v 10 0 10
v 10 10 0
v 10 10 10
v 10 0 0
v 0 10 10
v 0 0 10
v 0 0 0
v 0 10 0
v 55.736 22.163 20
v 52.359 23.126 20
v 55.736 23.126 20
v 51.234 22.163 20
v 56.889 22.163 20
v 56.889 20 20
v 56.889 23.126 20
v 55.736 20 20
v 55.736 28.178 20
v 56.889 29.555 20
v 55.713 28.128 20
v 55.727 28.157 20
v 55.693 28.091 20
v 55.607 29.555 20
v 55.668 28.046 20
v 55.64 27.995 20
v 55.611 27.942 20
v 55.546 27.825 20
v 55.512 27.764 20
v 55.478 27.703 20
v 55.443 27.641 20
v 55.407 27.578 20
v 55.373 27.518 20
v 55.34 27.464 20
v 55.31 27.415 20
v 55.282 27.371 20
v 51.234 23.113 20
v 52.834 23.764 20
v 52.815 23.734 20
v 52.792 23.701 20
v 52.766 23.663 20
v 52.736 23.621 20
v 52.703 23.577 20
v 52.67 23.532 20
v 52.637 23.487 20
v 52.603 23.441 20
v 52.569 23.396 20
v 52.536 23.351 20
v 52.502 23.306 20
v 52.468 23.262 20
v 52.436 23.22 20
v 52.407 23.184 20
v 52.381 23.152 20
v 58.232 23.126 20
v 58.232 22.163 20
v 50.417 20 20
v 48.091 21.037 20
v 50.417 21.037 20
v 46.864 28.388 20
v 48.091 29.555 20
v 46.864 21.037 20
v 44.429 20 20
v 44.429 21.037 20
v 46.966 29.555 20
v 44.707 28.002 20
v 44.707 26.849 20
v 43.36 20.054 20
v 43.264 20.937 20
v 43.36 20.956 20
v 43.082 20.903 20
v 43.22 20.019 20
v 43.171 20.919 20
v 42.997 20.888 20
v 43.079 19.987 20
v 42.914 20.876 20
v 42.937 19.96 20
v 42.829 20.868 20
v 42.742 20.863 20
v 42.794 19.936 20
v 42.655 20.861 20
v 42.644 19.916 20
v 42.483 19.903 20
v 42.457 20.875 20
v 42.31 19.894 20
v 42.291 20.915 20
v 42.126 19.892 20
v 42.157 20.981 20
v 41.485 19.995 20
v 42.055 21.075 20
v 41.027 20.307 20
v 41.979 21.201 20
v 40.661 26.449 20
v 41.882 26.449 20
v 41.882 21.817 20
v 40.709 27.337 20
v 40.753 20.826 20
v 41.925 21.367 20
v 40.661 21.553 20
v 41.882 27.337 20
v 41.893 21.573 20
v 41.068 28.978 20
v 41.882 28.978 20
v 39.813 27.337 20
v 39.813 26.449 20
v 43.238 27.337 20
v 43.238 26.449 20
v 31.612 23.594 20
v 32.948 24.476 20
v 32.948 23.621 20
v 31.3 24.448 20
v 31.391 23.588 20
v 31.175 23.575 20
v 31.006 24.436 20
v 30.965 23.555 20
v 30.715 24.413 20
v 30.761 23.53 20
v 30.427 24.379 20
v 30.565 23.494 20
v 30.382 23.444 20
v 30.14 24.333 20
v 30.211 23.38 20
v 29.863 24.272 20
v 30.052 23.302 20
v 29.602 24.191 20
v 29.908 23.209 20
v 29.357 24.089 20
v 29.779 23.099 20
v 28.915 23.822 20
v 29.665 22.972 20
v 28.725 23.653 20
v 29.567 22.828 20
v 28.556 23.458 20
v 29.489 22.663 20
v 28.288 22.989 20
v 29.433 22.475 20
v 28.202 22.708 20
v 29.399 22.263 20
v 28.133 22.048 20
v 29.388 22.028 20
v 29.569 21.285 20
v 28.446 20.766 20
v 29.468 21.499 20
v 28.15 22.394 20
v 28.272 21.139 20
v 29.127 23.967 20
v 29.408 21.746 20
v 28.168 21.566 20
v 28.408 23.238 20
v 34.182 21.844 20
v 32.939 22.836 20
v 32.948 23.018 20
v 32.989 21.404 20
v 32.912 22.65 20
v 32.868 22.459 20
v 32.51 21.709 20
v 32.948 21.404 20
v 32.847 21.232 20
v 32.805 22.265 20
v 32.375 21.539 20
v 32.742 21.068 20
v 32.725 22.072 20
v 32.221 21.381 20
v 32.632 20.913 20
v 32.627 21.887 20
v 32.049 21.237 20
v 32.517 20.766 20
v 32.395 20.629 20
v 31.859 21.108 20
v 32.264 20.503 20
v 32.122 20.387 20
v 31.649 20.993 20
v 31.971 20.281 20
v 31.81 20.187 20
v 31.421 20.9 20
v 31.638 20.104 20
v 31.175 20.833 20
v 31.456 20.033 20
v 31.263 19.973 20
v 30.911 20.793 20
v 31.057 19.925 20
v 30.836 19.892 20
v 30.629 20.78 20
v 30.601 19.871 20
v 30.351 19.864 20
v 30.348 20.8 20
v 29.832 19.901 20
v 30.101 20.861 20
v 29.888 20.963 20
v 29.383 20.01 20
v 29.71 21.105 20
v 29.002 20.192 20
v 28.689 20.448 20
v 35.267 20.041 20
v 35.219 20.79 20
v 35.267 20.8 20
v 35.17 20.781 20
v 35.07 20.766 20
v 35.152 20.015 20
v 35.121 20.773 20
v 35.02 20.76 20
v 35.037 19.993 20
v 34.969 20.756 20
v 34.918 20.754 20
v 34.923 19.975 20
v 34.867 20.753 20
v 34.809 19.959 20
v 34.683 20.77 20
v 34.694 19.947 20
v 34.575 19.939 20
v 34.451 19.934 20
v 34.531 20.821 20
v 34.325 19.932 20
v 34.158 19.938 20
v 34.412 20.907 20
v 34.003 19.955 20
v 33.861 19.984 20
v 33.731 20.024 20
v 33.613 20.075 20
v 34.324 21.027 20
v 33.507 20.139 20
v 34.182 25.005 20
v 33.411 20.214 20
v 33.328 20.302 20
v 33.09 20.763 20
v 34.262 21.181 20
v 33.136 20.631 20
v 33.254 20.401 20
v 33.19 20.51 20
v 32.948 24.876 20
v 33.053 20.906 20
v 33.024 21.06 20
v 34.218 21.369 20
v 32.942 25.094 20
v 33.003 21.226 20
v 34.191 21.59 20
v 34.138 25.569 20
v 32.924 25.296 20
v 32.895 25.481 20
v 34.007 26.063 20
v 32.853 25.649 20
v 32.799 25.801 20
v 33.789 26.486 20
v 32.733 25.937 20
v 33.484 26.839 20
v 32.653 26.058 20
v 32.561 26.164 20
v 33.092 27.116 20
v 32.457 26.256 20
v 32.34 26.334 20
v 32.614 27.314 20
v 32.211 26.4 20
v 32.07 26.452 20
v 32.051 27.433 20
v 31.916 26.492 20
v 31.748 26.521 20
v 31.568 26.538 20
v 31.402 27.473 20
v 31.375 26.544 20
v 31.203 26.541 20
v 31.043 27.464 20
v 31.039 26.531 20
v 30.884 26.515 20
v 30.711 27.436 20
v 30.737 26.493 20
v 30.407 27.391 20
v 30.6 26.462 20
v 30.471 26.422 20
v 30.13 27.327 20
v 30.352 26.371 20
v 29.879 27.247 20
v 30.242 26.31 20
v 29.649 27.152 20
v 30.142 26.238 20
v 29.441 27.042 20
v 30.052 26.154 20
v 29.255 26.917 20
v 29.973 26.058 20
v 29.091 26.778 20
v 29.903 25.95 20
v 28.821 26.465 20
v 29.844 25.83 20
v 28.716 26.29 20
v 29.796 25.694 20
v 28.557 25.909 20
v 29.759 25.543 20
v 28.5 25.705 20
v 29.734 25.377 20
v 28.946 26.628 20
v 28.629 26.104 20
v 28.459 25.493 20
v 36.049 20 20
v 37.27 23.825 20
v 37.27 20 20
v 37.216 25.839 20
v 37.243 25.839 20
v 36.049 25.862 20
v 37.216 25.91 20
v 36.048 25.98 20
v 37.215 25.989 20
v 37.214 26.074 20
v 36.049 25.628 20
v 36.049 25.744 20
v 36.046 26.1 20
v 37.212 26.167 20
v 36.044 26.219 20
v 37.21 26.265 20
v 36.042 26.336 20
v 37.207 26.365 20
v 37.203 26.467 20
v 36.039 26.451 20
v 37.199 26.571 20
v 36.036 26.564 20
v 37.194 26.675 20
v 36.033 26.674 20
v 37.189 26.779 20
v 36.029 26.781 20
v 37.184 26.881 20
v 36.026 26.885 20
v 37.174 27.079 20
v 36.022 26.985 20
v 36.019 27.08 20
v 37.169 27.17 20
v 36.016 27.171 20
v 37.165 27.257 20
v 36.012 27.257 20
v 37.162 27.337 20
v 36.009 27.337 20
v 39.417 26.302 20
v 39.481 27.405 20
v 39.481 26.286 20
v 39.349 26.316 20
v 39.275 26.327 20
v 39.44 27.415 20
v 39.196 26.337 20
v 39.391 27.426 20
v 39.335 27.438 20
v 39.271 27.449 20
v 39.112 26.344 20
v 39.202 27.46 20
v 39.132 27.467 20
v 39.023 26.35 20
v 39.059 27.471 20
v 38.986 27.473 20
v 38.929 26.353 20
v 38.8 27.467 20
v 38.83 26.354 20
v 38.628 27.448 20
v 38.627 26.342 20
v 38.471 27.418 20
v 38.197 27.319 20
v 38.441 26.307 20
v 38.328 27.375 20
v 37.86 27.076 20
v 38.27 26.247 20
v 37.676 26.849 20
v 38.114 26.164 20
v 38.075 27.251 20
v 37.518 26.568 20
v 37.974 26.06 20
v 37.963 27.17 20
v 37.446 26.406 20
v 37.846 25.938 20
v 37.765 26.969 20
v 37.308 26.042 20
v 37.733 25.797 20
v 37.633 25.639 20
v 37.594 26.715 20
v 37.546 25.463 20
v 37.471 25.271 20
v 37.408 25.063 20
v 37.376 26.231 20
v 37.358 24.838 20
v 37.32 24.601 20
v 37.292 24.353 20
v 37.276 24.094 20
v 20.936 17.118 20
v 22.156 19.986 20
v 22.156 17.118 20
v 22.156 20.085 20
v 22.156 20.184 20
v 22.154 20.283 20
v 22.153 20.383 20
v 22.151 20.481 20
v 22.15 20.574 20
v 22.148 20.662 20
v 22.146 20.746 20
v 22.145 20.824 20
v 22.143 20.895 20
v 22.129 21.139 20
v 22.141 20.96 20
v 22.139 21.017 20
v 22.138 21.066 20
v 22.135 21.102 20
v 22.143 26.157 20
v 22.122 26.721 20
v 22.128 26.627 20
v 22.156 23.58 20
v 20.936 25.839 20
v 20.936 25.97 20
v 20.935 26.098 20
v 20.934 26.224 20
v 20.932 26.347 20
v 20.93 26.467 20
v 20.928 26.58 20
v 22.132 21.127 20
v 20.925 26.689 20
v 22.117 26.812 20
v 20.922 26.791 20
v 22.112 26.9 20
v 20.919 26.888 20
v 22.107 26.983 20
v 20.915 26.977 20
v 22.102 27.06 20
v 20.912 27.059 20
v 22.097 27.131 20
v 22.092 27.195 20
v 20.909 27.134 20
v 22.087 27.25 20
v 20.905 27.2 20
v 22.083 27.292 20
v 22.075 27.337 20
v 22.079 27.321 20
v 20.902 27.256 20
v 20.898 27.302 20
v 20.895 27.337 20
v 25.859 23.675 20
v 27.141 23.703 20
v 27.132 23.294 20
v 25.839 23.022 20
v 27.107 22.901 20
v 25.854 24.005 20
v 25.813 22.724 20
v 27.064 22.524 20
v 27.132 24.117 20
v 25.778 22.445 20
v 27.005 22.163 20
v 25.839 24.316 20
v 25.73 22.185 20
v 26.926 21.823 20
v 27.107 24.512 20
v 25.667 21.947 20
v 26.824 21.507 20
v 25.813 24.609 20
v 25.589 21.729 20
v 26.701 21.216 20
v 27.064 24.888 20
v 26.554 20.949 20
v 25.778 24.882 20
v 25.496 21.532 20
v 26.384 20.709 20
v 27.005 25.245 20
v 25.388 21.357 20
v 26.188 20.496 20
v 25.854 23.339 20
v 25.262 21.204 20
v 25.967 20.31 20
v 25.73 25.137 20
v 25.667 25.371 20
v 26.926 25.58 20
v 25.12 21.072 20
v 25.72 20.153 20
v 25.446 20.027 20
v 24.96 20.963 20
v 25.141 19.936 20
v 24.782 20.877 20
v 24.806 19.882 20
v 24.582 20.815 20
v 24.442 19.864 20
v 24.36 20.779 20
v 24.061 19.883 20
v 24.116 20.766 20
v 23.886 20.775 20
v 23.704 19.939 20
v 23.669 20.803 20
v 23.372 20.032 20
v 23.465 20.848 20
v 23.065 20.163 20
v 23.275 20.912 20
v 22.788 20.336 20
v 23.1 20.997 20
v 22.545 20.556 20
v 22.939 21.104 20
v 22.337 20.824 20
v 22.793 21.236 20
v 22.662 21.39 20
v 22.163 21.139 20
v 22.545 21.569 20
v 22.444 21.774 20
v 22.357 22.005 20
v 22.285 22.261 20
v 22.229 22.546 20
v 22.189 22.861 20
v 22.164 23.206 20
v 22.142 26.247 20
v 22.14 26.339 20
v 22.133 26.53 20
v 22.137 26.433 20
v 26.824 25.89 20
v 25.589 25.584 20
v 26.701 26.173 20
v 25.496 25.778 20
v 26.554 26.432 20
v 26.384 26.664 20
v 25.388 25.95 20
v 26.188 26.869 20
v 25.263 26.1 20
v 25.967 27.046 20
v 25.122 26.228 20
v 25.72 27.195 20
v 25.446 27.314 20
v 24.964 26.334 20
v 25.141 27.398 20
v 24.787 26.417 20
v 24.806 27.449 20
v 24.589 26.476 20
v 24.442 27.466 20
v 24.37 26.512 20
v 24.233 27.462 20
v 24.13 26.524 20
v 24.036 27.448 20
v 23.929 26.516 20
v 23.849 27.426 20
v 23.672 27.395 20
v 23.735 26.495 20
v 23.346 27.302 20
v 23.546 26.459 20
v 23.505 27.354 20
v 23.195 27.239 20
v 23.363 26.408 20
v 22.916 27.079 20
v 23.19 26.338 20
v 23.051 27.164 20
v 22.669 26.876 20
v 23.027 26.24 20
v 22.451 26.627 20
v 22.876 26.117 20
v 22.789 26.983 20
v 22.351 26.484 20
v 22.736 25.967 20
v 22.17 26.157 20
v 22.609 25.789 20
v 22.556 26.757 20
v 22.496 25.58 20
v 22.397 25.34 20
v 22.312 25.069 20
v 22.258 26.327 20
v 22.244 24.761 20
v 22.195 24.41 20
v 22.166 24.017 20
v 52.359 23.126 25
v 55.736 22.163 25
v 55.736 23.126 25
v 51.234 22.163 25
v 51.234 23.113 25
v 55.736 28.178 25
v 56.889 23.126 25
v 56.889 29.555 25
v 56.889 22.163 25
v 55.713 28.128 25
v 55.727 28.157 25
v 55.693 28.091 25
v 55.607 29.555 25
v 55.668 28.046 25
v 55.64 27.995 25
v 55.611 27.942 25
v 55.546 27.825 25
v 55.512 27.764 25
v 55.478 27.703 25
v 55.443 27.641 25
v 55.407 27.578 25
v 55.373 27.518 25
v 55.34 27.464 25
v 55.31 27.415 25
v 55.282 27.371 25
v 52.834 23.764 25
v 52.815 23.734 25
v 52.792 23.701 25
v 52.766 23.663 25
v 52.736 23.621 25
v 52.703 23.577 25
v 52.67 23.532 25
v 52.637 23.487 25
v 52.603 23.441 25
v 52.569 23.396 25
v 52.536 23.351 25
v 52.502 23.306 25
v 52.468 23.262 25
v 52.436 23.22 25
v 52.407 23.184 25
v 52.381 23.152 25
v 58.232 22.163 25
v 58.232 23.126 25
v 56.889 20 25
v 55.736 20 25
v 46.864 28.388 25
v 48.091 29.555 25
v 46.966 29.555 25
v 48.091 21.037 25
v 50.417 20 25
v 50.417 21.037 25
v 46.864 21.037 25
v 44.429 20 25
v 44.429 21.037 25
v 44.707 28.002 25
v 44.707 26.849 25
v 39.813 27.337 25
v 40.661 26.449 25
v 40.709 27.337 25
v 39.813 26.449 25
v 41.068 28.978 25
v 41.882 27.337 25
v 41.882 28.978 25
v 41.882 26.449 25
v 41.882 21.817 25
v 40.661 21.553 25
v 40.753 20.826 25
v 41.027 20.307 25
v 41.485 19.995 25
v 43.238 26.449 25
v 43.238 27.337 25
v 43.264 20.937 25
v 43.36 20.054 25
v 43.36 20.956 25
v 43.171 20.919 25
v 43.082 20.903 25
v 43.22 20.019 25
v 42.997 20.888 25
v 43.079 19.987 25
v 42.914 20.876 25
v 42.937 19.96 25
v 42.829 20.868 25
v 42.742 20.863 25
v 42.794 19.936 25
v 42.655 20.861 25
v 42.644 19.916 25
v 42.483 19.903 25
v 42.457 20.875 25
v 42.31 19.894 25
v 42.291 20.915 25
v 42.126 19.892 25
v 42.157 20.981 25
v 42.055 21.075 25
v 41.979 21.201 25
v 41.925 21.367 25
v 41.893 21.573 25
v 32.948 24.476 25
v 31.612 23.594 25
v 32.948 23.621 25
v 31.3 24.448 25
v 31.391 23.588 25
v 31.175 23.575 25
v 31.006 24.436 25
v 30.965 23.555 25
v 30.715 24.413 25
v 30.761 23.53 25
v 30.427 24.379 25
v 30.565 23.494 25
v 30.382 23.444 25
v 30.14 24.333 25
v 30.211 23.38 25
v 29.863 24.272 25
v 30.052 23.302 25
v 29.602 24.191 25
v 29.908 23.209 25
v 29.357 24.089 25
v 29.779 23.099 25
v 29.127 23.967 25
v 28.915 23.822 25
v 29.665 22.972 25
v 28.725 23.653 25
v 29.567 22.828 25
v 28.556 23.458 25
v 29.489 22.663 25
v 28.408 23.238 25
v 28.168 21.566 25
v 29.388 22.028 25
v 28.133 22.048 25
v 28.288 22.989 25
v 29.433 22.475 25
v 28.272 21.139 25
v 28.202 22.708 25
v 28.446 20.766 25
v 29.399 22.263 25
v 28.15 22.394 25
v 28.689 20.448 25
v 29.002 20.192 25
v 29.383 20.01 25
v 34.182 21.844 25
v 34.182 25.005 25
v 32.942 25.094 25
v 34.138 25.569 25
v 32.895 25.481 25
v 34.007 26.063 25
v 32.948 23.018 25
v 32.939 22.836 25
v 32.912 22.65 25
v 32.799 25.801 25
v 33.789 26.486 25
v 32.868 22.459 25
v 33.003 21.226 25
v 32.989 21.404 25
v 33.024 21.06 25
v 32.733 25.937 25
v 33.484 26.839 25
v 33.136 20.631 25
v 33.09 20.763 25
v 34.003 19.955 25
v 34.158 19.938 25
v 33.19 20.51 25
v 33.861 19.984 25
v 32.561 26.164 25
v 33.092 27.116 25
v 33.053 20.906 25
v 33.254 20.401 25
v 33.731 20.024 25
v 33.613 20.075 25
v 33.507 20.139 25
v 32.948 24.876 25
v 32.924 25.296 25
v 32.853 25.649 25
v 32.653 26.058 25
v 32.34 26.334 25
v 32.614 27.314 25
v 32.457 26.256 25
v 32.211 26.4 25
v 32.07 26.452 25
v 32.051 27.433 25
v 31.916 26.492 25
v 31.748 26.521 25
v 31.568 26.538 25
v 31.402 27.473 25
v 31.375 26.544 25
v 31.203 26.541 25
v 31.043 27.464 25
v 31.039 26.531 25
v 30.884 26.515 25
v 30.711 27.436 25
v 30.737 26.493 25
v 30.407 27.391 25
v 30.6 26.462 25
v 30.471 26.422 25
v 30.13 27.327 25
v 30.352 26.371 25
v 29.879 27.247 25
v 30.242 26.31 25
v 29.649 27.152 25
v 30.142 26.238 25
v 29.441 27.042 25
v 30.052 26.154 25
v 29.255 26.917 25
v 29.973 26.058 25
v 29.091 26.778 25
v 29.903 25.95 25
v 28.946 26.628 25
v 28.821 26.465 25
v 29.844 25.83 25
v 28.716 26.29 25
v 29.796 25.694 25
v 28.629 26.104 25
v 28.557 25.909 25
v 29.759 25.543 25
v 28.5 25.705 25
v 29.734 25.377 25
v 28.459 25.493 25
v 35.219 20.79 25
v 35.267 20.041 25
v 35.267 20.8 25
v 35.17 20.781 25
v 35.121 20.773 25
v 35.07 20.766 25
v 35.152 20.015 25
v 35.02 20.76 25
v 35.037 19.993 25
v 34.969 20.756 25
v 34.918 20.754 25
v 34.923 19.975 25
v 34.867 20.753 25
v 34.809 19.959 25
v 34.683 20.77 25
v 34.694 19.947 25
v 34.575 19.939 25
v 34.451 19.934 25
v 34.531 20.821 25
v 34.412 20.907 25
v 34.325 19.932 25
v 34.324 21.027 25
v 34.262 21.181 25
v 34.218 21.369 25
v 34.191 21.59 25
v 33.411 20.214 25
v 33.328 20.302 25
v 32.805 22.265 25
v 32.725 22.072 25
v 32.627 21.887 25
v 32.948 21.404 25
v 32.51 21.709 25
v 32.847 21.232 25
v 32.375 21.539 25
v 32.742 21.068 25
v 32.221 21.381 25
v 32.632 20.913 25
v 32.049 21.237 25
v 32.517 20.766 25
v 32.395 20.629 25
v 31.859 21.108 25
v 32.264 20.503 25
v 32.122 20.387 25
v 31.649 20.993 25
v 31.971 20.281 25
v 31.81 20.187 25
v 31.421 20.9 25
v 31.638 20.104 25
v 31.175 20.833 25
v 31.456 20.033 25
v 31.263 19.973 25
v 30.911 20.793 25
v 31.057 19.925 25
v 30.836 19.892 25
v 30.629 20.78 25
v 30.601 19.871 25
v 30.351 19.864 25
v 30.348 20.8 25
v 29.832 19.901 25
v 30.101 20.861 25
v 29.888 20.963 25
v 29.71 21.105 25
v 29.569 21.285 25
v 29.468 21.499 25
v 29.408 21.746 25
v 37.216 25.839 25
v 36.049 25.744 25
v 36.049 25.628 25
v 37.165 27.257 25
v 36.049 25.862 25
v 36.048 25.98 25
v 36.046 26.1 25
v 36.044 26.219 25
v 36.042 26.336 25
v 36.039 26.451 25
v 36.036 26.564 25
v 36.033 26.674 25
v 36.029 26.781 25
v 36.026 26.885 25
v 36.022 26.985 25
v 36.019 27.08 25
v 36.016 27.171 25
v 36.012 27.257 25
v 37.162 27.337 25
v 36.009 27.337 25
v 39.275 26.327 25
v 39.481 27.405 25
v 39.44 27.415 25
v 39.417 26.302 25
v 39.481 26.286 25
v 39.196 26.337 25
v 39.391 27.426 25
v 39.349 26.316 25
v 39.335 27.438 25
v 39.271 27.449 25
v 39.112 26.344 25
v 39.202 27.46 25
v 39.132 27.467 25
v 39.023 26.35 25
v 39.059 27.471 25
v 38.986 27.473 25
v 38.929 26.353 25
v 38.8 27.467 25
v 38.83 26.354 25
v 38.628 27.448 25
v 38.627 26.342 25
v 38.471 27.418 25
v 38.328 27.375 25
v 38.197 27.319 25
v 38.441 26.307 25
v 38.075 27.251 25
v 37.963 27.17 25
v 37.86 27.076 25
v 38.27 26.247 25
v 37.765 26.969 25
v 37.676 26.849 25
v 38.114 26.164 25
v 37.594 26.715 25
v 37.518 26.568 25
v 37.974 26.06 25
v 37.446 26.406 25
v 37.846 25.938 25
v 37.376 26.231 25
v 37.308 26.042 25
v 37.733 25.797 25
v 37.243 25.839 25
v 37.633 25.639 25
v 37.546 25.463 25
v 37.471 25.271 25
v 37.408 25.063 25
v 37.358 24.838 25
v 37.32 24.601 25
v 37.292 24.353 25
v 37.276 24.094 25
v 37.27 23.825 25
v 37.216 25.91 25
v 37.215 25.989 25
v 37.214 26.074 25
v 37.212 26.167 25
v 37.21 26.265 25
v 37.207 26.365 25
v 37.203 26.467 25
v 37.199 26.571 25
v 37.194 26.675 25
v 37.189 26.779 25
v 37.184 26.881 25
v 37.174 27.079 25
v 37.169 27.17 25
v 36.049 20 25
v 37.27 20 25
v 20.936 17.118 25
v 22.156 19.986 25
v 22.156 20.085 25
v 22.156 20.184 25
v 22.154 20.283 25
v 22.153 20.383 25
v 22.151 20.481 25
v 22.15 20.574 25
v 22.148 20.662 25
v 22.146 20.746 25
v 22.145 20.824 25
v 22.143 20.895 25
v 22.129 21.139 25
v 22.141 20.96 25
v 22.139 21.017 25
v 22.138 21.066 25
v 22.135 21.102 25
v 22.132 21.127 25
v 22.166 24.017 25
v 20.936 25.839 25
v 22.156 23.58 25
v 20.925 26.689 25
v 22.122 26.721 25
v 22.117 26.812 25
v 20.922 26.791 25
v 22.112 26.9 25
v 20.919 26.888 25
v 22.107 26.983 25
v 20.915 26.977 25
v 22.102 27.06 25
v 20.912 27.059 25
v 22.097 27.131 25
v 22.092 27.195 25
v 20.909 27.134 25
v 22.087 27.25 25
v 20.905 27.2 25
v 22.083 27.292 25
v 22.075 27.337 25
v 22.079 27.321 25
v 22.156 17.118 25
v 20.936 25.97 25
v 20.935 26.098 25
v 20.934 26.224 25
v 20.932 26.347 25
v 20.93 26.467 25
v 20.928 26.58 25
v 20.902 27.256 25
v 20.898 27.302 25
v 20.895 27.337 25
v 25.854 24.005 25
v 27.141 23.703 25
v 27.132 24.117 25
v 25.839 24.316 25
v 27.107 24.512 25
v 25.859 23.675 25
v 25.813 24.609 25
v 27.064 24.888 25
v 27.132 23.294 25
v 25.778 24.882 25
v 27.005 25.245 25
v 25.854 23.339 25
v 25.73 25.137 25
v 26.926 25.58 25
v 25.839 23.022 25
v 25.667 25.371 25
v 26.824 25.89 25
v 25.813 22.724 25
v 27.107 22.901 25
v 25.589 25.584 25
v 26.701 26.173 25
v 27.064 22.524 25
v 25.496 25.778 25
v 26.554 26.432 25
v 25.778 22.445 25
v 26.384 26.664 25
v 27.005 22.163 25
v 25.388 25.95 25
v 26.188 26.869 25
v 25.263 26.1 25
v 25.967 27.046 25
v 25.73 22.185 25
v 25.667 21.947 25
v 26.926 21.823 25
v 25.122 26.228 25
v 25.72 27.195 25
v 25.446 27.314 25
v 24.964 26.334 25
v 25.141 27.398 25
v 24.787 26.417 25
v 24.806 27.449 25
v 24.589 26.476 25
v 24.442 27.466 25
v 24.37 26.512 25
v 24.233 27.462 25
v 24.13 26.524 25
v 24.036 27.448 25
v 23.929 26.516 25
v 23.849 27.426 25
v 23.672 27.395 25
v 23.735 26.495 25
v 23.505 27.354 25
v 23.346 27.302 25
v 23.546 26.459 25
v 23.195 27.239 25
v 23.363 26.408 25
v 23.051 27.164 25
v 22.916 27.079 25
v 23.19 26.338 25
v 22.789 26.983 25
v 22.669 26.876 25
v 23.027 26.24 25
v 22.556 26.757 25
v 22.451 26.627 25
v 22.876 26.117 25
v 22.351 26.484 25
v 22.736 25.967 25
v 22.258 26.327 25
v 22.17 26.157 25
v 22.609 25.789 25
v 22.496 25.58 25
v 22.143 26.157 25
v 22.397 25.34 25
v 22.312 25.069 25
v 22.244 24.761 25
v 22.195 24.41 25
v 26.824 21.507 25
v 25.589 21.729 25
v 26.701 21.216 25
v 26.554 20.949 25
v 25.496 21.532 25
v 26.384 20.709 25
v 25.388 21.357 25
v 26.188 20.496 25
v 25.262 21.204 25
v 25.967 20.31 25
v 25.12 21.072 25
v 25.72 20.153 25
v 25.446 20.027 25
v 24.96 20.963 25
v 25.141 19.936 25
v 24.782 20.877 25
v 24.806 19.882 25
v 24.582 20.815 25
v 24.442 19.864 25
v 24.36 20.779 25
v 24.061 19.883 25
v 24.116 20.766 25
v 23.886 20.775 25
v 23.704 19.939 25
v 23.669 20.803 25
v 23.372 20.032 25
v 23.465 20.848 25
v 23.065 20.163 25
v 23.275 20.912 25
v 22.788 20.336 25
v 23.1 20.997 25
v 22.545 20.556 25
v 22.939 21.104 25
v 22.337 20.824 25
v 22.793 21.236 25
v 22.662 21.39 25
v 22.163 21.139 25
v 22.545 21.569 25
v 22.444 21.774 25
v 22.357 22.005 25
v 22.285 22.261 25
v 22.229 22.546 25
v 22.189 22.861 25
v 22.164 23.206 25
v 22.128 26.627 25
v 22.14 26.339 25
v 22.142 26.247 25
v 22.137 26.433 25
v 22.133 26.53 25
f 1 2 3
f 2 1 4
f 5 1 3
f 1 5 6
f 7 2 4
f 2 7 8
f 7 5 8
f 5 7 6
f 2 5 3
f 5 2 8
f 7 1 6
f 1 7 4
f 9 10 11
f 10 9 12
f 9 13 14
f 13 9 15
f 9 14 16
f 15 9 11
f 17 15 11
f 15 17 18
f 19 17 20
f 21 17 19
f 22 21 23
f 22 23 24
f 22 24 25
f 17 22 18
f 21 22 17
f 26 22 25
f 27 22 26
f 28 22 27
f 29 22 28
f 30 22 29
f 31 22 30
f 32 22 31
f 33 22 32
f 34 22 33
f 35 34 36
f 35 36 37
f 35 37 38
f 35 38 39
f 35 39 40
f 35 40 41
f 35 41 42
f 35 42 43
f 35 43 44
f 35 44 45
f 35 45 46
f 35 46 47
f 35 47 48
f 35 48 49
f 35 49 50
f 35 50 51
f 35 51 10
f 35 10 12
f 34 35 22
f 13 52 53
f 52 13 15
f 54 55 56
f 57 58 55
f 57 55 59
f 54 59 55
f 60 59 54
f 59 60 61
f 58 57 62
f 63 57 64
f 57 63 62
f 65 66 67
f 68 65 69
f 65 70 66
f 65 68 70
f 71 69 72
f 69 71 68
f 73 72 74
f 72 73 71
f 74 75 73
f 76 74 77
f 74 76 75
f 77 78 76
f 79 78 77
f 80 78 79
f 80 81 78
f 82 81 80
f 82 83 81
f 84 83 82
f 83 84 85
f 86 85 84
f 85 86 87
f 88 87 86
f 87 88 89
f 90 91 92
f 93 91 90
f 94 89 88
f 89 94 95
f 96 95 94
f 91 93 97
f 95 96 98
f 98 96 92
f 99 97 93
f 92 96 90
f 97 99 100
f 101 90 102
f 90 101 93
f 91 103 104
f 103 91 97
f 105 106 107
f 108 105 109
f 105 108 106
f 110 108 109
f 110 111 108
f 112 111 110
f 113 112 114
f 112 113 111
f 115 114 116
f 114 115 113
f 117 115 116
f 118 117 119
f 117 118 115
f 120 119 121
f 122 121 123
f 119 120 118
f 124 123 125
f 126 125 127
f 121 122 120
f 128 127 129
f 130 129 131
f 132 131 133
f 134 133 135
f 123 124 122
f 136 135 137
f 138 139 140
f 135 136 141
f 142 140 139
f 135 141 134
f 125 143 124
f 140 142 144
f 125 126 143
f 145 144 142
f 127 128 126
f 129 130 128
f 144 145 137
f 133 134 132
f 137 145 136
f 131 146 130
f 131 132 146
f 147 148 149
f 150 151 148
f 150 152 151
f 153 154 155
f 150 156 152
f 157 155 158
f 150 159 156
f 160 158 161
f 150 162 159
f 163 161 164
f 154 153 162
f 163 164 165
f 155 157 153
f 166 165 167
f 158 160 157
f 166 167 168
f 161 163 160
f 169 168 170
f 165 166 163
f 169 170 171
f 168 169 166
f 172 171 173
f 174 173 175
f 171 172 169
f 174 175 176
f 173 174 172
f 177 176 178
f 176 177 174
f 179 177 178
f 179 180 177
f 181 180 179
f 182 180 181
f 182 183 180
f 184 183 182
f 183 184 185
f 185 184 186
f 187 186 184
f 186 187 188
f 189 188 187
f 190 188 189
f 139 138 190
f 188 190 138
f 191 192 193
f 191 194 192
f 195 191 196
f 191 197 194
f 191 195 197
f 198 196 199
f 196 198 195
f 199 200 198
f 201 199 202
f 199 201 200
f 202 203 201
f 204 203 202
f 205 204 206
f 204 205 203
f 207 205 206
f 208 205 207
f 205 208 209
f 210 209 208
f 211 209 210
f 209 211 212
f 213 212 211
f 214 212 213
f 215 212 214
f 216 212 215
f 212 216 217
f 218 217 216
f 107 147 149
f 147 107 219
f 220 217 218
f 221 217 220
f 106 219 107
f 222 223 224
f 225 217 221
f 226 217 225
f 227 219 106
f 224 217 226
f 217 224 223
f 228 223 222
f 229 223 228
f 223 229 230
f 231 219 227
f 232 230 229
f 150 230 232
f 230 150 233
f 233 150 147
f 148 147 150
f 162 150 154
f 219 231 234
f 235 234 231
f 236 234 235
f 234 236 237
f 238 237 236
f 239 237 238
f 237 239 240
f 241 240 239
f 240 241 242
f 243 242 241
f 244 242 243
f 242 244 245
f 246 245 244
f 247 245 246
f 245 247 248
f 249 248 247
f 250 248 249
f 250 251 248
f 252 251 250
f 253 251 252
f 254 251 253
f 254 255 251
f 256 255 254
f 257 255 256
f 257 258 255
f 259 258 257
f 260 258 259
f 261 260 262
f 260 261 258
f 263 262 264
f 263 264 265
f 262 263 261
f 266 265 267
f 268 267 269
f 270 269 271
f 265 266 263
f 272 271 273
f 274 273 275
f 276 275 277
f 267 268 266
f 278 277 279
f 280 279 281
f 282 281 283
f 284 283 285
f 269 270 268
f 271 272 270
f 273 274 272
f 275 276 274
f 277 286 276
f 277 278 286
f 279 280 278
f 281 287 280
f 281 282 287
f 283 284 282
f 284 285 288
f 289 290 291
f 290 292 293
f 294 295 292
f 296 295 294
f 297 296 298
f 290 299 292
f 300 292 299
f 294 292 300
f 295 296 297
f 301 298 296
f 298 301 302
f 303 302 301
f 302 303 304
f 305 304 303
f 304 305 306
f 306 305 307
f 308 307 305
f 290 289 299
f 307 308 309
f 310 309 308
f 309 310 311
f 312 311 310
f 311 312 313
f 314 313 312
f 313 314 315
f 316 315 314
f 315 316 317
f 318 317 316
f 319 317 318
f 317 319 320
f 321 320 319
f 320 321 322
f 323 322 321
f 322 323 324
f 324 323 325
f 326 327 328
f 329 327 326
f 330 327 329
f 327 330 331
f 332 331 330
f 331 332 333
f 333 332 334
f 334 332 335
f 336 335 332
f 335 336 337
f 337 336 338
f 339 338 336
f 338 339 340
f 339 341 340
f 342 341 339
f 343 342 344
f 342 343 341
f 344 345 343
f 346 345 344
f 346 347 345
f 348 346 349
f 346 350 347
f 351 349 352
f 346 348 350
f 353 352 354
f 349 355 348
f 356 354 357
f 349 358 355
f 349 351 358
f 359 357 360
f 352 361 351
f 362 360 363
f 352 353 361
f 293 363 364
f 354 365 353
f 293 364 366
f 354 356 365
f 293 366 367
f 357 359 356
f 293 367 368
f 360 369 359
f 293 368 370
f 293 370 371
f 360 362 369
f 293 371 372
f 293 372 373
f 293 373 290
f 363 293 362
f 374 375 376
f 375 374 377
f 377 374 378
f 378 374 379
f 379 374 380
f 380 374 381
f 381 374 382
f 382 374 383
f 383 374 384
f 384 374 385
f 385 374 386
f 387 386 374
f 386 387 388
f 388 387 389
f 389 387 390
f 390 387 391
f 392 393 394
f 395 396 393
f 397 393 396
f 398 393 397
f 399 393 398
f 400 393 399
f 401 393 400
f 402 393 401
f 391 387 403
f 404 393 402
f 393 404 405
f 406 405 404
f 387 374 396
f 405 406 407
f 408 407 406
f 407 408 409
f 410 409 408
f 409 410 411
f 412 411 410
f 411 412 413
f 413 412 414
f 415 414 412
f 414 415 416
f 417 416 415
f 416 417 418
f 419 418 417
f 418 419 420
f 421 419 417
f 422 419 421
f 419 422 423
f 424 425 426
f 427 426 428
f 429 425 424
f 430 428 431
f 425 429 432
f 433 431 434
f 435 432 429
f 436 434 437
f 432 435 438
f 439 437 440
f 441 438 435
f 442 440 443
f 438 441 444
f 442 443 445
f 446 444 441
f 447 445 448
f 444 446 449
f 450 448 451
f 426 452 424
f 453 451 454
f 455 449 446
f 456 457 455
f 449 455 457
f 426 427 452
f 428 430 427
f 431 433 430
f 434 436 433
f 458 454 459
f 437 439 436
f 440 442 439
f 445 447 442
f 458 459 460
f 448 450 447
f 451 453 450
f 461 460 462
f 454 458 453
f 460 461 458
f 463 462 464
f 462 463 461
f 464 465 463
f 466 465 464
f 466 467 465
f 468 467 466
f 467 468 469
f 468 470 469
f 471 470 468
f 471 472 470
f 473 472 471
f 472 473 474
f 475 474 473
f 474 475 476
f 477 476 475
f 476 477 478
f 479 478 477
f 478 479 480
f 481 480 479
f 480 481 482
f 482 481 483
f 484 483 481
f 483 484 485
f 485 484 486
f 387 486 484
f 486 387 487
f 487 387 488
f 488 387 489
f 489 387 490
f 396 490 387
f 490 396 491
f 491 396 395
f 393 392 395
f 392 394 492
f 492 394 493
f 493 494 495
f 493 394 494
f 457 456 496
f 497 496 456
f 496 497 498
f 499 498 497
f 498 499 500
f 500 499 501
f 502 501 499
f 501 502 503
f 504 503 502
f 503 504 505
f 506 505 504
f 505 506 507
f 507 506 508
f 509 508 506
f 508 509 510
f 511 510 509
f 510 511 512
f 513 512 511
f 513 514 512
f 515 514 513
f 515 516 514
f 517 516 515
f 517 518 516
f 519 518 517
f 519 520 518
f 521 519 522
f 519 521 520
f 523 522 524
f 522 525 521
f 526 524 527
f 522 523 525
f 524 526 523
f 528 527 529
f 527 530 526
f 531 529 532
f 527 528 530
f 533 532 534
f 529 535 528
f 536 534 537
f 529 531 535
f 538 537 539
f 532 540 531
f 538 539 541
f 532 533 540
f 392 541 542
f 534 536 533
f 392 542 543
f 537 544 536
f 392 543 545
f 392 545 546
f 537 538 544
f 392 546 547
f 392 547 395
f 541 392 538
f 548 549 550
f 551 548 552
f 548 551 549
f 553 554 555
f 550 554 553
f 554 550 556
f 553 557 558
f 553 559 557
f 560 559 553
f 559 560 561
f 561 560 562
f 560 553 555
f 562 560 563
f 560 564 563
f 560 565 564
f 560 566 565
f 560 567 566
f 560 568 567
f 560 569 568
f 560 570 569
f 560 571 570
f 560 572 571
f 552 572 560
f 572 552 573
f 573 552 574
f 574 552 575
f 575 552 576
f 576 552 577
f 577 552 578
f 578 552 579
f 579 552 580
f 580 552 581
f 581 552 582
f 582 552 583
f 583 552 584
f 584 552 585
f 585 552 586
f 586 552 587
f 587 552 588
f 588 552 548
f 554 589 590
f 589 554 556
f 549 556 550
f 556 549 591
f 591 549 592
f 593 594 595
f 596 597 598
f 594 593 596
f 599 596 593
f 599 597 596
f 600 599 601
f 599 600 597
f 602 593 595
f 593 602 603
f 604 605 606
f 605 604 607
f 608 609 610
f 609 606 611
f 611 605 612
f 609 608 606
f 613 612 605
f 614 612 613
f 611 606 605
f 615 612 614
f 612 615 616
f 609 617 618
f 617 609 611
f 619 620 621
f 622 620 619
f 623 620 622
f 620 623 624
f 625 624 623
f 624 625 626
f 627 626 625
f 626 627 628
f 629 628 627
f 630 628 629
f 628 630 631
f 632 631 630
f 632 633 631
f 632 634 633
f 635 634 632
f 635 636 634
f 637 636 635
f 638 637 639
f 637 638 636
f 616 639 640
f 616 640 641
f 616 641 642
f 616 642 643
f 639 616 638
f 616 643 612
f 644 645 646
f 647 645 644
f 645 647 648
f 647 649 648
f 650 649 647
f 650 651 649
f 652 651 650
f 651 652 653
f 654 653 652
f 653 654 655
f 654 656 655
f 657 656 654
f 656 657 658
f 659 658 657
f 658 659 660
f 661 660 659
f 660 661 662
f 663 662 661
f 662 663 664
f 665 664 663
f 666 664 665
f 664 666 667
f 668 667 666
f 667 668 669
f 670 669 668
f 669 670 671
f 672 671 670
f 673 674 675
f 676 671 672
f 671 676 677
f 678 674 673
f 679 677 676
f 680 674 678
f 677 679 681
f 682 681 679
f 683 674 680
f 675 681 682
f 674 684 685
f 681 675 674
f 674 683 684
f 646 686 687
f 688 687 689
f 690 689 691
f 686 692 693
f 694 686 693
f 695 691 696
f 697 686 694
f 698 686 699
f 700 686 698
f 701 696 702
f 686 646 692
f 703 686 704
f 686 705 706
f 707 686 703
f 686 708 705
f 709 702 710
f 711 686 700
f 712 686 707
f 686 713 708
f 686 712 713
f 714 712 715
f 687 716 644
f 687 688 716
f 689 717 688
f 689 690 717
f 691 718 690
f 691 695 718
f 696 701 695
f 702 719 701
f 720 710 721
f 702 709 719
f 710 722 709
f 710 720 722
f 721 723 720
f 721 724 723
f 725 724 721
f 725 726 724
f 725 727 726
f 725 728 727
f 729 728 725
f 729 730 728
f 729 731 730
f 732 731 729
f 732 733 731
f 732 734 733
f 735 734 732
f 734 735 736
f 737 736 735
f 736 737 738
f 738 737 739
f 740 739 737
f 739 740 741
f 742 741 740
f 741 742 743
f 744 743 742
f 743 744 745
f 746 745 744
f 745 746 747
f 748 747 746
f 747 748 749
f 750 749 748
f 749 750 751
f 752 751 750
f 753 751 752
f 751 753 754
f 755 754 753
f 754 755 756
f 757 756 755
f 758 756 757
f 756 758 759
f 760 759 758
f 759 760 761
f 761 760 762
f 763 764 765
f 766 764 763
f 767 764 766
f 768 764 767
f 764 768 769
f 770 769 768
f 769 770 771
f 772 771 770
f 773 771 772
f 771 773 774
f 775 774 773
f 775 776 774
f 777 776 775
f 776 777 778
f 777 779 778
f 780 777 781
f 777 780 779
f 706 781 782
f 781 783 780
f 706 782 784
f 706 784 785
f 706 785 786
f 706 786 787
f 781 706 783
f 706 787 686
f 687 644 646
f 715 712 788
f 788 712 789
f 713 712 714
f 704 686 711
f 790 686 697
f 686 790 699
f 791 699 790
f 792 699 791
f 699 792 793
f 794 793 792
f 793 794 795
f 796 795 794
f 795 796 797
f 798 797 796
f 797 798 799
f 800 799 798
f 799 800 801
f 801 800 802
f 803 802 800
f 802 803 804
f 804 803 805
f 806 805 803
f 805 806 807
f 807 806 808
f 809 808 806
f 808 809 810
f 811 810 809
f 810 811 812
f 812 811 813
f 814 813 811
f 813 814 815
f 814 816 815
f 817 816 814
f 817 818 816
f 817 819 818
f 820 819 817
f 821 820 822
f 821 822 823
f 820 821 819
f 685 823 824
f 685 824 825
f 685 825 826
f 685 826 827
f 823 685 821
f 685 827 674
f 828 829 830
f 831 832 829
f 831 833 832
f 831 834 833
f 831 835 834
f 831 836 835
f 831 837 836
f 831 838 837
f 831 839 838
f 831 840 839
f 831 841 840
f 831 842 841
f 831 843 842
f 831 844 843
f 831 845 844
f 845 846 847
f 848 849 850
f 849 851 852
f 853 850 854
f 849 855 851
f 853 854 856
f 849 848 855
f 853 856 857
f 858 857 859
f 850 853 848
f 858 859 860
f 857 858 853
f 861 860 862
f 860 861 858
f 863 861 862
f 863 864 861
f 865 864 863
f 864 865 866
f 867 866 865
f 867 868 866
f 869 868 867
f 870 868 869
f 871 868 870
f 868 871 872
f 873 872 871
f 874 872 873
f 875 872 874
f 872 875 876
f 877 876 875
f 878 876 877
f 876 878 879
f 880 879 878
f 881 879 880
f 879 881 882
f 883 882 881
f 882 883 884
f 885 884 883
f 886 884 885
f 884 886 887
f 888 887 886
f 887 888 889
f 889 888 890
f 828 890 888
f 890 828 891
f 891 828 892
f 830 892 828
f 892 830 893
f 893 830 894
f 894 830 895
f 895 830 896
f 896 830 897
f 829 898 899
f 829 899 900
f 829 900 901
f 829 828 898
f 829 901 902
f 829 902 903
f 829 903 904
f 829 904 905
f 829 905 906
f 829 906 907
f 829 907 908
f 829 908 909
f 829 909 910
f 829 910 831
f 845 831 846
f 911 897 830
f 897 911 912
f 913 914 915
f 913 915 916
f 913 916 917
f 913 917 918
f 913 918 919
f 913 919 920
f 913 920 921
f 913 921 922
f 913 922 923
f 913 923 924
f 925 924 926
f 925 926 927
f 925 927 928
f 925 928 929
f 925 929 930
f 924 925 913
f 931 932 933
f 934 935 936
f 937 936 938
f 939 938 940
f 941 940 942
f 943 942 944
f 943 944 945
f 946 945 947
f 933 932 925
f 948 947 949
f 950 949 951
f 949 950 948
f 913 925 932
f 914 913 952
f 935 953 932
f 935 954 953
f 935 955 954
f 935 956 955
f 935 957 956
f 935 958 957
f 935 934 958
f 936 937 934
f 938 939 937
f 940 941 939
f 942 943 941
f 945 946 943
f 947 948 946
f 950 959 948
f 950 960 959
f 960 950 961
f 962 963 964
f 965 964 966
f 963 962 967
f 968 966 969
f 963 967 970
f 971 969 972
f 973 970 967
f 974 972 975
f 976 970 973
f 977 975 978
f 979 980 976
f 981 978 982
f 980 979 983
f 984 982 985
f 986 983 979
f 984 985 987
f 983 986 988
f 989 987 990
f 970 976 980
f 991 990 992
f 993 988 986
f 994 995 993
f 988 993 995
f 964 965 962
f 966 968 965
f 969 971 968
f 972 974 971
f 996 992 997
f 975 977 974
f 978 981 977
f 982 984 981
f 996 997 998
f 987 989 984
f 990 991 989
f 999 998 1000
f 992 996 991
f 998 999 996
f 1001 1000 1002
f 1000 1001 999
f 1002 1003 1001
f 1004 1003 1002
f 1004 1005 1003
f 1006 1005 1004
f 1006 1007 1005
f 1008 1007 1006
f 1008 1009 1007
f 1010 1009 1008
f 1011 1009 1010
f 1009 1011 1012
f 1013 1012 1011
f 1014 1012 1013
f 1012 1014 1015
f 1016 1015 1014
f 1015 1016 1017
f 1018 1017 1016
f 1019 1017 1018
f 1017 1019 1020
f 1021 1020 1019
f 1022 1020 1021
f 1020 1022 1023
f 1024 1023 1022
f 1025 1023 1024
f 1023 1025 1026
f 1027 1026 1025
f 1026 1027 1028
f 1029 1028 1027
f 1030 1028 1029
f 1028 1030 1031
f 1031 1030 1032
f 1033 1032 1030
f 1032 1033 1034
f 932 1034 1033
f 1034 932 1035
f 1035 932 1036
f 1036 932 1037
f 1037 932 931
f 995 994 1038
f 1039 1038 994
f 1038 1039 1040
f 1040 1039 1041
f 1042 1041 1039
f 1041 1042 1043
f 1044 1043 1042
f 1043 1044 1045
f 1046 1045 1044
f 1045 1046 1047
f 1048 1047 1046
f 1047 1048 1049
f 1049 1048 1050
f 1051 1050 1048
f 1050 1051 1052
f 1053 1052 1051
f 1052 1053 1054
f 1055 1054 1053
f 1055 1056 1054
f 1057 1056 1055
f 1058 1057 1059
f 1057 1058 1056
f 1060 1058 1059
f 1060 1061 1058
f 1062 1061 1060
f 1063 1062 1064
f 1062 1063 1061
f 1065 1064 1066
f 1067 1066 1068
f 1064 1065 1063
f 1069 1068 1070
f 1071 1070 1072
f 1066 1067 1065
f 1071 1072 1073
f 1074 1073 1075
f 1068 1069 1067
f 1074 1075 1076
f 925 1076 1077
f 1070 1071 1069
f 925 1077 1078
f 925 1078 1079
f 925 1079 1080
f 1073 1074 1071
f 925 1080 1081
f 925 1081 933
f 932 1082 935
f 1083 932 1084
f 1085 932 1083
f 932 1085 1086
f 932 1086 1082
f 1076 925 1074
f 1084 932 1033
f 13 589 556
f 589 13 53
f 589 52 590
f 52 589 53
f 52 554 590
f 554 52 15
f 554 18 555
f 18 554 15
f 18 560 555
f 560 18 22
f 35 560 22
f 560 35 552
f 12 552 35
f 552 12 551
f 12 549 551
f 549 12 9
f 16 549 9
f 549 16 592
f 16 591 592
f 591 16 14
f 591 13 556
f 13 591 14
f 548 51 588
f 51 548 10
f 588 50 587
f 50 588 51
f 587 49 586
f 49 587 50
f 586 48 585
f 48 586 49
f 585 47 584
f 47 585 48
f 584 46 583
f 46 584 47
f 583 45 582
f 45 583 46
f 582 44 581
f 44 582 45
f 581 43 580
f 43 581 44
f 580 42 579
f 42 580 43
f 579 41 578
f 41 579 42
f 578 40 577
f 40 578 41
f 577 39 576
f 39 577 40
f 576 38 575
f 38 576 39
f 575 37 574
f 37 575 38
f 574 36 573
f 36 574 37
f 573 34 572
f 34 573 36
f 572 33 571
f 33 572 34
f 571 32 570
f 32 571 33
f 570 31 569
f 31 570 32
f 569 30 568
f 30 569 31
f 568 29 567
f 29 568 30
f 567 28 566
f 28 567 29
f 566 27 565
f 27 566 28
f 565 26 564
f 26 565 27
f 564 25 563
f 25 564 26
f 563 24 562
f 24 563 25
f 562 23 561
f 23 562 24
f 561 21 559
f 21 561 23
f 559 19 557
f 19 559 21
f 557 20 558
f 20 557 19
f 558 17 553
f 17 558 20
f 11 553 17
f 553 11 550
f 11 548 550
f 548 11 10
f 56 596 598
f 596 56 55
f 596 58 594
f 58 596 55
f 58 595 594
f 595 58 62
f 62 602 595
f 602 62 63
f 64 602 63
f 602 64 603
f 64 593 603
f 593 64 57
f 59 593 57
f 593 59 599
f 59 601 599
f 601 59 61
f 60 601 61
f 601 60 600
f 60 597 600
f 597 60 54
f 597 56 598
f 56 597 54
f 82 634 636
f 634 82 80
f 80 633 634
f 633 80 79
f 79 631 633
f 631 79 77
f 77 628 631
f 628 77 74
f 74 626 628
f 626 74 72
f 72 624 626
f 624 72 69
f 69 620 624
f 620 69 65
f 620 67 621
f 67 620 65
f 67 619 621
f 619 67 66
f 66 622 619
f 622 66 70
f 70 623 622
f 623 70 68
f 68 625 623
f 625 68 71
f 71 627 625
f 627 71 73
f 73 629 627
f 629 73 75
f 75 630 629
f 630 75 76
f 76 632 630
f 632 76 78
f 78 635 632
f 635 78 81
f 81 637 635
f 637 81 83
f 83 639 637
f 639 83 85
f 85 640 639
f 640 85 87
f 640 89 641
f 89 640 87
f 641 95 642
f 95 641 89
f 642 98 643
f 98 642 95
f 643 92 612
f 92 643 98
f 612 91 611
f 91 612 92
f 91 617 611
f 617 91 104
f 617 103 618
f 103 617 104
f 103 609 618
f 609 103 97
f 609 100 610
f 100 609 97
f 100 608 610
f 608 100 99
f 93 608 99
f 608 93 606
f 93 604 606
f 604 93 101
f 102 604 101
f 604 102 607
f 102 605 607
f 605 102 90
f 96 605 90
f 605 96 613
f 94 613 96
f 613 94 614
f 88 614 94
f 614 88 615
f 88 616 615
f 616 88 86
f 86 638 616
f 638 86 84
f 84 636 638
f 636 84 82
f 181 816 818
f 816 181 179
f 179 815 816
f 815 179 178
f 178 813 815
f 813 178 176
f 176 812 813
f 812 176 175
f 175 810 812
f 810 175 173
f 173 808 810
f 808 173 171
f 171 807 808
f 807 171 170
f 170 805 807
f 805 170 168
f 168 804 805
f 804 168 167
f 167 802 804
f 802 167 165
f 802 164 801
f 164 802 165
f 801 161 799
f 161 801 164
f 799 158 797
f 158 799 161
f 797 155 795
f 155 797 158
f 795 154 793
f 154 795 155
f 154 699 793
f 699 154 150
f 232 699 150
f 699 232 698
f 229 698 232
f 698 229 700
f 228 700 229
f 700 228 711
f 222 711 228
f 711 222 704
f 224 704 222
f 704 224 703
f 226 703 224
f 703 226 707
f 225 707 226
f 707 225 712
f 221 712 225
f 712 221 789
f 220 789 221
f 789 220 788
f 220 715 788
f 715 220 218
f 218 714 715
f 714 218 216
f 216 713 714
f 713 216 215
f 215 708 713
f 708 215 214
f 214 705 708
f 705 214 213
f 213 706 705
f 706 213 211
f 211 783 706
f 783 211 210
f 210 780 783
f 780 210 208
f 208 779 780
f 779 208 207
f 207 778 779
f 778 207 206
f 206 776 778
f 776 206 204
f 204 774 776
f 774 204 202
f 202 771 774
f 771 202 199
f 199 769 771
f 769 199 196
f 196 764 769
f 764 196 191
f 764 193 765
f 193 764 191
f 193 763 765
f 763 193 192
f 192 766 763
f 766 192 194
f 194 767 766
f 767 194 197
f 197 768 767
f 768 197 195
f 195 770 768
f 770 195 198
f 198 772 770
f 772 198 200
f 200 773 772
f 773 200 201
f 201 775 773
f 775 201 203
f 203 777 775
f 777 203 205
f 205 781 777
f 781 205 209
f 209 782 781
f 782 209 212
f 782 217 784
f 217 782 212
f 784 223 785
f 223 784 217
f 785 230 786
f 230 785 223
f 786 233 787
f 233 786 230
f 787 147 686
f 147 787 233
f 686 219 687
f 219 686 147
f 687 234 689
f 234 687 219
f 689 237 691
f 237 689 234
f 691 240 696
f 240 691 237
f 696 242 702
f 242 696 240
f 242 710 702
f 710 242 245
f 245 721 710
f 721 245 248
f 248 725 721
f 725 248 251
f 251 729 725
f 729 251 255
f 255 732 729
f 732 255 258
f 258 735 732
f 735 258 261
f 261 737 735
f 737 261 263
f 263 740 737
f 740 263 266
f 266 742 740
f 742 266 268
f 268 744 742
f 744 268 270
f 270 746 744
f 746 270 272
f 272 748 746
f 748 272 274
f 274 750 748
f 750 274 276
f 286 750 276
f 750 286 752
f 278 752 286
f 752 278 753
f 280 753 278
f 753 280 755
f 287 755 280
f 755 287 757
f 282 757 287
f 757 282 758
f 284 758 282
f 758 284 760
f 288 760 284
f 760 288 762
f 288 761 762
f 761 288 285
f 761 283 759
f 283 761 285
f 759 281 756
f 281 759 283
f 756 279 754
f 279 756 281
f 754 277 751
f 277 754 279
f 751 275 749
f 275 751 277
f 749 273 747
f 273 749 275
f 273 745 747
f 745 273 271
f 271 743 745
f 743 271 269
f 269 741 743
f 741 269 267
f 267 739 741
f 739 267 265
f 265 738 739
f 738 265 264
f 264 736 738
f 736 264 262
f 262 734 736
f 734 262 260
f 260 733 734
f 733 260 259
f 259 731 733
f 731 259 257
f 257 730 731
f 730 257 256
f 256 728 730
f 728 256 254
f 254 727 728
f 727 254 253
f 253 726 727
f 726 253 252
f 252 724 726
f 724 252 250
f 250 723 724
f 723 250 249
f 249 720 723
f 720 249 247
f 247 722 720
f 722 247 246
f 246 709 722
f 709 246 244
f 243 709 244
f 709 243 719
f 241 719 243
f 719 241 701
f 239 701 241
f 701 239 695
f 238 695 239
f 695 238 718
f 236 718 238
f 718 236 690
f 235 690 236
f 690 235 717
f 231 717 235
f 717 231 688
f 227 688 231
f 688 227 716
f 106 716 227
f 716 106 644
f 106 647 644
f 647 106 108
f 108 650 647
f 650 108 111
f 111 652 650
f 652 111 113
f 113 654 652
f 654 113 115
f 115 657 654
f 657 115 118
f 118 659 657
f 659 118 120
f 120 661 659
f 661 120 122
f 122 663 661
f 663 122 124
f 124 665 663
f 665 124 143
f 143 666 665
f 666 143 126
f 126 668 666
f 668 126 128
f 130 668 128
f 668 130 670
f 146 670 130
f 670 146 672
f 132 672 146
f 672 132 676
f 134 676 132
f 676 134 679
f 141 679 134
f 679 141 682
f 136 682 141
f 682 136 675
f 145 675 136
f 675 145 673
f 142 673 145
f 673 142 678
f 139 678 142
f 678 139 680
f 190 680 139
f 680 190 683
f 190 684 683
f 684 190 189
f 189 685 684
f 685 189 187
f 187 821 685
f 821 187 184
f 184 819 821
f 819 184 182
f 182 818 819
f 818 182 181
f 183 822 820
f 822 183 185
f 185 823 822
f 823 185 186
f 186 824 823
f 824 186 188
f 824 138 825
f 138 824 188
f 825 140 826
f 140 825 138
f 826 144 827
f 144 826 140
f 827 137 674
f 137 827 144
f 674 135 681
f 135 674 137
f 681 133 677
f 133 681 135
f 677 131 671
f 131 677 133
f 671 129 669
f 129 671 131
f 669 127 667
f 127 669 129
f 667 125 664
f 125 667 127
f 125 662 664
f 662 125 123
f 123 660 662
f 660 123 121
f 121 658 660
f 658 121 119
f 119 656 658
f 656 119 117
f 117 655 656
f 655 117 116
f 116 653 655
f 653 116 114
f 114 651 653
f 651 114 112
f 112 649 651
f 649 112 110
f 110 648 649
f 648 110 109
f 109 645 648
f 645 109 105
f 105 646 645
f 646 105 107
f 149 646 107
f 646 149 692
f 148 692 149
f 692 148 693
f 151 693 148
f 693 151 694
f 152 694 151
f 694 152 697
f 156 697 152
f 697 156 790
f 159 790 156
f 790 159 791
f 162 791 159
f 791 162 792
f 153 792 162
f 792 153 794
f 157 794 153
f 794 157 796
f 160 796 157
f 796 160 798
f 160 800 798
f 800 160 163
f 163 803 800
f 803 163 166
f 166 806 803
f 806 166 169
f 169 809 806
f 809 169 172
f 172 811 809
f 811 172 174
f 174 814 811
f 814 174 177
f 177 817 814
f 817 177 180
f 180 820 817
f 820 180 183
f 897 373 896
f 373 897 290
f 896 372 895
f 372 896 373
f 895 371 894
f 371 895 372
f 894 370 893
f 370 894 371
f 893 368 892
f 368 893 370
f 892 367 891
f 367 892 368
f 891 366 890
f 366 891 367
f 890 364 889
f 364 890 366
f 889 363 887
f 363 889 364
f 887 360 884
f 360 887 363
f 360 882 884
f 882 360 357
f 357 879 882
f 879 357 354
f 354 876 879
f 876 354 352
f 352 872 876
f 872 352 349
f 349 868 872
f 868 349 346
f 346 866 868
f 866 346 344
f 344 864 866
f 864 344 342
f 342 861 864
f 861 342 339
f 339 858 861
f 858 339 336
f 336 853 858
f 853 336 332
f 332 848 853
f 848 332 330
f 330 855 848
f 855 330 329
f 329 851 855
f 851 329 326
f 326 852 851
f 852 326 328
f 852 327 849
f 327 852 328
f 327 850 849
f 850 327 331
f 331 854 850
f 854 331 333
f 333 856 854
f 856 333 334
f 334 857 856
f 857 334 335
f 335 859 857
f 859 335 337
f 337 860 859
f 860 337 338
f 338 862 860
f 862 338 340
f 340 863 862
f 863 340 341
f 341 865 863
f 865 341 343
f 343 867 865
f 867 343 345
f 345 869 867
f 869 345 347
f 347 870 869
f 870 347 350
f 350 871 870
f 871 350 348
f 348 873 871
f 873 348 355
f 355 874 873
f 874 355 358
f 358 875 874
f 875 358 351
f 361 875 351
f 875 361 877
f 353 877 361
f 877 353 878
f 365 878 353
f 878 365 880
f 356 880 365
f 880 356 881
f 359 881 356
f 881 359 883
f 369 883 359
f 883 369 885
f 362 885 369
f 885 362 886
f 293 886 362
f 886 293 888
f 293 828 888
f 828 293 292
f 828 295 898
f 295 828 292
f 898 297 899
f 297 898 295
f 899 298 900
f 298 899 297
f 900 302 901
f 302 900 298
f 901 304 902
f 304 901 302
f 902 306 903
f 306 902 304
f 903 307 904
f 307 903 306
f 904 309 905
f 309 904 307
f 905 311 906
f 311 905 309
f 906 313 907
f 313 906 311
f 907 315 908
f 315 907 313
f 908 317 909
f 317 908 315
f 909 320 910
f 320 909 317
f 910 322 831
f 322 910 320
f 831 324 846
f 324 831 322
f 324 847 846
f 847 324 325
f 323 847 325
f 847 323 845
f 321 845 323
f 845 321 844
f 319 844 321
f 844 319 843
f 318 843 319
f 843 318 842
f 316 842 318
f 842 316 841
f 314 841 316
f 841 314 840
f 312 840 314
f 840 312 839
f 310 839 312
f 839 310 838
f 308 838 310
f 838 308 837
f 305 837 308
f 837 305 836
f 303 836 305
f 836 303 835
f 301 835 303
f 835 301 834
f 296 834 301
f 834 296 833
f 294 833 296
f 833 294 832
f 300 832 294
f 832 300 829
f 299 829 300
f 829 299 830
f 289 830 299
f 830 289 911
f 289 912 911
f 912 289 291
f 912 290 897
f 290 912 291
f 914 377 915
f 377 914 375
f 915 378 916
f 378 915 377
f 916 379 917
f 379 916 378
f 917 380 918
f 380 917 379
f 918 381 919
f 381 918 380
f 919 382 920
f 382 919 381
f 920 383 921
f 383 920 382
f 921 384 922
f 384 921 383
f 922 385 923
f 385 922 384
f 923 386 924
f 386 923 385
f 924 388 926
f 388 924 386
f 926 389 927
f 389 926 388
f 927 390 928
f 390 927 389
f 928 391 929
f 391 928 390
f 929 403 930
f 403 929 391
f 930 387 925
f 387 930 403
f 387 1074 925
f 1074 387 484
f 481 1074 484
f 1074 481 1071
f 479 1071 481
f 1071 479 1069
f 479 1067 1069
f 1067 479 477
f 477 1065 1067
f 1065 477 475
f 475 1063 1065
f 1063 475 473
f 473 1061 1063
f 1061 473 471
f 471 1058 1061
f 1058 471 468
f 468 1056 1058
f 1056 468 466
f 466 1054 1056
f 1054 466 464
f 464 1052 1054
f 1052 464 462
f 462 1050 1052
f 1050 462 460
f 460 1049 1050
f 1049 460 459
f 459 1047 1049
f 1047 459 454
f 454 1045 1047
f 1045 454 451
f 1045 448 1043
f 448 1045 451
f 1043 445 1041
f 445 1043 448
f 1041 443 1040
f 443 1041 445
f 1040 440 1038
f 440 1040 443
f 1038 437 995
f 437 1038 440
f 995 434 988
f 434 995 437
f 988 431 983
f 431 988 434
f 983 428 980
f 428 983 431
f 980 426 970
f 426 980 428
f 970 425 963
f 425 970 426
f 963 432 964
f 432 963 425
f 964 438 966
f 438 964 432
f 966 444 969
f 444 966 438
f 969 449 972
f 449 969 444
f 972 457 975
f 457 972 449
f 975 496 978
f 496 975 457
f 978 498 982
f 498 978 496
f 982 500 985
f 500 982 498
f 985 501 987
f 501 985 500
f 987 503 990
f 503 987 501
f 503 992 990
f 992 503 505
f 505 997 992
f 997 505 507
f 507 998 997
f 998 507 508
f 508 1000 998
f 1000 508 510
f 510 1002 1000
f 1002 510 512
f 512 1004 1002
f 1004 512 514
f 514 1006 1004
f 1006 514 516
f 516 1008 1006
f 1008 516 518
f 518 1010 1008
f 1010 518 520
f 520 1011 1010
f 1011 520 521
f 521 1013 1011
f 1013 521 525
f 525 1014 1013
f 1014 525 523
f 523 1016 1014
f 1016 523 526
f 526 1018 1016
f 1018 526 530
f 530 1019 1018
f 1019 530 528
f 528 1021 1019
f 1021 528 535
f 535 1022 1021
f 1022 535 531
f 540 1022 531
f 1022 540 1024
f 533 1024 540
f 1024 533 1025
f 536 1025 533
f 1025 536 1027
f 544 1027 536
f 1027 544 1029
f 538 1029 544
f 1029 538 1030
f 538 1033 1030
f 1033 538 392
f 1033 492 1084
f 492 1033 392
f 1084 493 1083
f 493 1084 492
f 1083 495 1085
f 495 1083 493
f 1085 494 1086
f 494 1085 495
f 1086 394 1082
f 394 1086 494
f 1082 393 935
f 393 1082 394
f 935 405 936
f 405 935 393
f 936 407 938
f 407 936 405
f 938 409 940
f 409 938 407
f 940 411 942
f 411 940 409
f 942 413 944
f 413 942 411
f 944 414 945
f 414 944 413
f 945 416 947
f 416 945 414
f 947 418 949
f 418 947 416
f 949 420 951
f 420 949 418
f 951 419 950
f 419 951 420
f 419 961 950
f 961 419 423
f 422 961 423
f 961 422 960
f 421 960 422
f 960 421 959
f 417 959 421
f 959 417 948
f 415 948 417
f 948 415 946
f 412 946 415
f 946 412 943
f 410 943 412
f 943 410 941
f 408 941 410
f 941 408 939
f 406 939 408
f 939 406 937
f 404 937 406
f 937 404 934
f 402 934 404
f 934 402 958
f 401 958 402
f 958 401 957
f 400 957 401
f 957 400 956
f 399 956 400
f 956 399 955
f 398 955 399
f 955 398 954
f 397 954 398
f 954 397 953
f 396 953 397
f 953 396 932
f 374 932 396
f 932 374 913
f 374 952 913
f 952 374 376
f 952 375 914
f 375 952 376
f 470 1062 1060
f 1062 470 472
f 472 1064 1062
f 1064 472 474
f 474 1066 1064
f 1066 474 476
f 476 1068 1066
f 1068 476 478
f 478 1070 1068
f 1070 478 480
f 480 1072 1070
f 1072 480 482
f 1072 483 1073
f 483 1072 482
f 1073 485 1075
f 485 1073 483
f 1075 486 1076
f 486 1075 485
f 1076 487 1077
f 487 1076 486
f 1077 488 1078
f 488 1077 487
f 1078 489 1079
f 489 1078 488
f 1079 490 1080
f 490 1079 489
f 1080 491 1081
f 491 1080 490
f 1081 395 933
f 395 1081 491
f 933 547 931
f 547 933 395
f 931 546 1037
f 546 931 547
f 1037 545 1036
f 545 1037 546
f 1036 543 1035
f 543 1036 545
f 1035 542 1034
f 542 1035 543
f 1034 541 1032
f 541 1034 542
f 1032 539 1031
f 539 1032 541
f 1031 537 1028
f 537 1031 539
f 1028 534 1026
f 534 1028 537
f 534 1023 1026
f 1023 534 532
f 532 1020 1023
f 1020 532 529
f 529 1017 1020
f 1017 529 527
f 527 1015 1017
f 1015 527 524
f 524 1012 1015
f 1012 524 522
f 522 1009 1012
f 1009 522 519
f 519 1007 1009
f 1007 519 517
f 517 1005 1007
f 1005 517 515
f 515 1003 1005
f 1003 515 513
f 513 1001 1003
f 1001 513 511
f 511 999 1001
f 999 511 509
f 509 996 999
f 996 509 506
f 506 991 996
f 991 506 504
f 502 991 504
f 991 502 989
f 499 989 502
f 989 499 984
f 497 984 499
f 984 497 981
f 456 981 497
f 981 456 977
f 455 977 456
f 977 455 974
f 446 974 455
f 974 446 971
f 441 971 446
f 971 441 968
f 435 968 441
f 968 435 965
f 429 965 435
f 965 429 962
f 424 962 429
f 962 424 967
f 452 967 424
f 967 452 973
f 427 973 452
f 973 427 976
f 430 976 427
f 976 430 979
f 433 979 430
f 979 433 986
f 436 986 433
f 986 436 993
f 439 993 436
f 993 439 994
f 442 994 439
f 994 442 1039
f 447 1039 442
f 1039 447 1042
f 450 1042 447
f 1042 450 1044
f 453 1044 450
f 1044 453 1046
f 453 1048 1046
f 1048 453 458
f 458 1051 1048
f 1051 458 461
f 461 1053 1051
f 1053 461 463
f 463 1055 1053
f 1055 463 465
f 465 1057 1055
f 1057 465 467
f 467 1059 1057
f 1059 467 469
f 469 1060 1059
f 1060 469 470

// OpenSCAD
//[CUSTOMIZATION]
// X Dimension
xdim=10;
// Y Dimension
ydim=5;
// Z Dimension
zdim=5;
// Message
txt="part14";
module __END_CUSTOMIZATIONS () {}
cube(xdim,ydim,zdim);
translate([20,20,20]) { linear_extrude(5) text(txt, font="Liberation Sans"); }
